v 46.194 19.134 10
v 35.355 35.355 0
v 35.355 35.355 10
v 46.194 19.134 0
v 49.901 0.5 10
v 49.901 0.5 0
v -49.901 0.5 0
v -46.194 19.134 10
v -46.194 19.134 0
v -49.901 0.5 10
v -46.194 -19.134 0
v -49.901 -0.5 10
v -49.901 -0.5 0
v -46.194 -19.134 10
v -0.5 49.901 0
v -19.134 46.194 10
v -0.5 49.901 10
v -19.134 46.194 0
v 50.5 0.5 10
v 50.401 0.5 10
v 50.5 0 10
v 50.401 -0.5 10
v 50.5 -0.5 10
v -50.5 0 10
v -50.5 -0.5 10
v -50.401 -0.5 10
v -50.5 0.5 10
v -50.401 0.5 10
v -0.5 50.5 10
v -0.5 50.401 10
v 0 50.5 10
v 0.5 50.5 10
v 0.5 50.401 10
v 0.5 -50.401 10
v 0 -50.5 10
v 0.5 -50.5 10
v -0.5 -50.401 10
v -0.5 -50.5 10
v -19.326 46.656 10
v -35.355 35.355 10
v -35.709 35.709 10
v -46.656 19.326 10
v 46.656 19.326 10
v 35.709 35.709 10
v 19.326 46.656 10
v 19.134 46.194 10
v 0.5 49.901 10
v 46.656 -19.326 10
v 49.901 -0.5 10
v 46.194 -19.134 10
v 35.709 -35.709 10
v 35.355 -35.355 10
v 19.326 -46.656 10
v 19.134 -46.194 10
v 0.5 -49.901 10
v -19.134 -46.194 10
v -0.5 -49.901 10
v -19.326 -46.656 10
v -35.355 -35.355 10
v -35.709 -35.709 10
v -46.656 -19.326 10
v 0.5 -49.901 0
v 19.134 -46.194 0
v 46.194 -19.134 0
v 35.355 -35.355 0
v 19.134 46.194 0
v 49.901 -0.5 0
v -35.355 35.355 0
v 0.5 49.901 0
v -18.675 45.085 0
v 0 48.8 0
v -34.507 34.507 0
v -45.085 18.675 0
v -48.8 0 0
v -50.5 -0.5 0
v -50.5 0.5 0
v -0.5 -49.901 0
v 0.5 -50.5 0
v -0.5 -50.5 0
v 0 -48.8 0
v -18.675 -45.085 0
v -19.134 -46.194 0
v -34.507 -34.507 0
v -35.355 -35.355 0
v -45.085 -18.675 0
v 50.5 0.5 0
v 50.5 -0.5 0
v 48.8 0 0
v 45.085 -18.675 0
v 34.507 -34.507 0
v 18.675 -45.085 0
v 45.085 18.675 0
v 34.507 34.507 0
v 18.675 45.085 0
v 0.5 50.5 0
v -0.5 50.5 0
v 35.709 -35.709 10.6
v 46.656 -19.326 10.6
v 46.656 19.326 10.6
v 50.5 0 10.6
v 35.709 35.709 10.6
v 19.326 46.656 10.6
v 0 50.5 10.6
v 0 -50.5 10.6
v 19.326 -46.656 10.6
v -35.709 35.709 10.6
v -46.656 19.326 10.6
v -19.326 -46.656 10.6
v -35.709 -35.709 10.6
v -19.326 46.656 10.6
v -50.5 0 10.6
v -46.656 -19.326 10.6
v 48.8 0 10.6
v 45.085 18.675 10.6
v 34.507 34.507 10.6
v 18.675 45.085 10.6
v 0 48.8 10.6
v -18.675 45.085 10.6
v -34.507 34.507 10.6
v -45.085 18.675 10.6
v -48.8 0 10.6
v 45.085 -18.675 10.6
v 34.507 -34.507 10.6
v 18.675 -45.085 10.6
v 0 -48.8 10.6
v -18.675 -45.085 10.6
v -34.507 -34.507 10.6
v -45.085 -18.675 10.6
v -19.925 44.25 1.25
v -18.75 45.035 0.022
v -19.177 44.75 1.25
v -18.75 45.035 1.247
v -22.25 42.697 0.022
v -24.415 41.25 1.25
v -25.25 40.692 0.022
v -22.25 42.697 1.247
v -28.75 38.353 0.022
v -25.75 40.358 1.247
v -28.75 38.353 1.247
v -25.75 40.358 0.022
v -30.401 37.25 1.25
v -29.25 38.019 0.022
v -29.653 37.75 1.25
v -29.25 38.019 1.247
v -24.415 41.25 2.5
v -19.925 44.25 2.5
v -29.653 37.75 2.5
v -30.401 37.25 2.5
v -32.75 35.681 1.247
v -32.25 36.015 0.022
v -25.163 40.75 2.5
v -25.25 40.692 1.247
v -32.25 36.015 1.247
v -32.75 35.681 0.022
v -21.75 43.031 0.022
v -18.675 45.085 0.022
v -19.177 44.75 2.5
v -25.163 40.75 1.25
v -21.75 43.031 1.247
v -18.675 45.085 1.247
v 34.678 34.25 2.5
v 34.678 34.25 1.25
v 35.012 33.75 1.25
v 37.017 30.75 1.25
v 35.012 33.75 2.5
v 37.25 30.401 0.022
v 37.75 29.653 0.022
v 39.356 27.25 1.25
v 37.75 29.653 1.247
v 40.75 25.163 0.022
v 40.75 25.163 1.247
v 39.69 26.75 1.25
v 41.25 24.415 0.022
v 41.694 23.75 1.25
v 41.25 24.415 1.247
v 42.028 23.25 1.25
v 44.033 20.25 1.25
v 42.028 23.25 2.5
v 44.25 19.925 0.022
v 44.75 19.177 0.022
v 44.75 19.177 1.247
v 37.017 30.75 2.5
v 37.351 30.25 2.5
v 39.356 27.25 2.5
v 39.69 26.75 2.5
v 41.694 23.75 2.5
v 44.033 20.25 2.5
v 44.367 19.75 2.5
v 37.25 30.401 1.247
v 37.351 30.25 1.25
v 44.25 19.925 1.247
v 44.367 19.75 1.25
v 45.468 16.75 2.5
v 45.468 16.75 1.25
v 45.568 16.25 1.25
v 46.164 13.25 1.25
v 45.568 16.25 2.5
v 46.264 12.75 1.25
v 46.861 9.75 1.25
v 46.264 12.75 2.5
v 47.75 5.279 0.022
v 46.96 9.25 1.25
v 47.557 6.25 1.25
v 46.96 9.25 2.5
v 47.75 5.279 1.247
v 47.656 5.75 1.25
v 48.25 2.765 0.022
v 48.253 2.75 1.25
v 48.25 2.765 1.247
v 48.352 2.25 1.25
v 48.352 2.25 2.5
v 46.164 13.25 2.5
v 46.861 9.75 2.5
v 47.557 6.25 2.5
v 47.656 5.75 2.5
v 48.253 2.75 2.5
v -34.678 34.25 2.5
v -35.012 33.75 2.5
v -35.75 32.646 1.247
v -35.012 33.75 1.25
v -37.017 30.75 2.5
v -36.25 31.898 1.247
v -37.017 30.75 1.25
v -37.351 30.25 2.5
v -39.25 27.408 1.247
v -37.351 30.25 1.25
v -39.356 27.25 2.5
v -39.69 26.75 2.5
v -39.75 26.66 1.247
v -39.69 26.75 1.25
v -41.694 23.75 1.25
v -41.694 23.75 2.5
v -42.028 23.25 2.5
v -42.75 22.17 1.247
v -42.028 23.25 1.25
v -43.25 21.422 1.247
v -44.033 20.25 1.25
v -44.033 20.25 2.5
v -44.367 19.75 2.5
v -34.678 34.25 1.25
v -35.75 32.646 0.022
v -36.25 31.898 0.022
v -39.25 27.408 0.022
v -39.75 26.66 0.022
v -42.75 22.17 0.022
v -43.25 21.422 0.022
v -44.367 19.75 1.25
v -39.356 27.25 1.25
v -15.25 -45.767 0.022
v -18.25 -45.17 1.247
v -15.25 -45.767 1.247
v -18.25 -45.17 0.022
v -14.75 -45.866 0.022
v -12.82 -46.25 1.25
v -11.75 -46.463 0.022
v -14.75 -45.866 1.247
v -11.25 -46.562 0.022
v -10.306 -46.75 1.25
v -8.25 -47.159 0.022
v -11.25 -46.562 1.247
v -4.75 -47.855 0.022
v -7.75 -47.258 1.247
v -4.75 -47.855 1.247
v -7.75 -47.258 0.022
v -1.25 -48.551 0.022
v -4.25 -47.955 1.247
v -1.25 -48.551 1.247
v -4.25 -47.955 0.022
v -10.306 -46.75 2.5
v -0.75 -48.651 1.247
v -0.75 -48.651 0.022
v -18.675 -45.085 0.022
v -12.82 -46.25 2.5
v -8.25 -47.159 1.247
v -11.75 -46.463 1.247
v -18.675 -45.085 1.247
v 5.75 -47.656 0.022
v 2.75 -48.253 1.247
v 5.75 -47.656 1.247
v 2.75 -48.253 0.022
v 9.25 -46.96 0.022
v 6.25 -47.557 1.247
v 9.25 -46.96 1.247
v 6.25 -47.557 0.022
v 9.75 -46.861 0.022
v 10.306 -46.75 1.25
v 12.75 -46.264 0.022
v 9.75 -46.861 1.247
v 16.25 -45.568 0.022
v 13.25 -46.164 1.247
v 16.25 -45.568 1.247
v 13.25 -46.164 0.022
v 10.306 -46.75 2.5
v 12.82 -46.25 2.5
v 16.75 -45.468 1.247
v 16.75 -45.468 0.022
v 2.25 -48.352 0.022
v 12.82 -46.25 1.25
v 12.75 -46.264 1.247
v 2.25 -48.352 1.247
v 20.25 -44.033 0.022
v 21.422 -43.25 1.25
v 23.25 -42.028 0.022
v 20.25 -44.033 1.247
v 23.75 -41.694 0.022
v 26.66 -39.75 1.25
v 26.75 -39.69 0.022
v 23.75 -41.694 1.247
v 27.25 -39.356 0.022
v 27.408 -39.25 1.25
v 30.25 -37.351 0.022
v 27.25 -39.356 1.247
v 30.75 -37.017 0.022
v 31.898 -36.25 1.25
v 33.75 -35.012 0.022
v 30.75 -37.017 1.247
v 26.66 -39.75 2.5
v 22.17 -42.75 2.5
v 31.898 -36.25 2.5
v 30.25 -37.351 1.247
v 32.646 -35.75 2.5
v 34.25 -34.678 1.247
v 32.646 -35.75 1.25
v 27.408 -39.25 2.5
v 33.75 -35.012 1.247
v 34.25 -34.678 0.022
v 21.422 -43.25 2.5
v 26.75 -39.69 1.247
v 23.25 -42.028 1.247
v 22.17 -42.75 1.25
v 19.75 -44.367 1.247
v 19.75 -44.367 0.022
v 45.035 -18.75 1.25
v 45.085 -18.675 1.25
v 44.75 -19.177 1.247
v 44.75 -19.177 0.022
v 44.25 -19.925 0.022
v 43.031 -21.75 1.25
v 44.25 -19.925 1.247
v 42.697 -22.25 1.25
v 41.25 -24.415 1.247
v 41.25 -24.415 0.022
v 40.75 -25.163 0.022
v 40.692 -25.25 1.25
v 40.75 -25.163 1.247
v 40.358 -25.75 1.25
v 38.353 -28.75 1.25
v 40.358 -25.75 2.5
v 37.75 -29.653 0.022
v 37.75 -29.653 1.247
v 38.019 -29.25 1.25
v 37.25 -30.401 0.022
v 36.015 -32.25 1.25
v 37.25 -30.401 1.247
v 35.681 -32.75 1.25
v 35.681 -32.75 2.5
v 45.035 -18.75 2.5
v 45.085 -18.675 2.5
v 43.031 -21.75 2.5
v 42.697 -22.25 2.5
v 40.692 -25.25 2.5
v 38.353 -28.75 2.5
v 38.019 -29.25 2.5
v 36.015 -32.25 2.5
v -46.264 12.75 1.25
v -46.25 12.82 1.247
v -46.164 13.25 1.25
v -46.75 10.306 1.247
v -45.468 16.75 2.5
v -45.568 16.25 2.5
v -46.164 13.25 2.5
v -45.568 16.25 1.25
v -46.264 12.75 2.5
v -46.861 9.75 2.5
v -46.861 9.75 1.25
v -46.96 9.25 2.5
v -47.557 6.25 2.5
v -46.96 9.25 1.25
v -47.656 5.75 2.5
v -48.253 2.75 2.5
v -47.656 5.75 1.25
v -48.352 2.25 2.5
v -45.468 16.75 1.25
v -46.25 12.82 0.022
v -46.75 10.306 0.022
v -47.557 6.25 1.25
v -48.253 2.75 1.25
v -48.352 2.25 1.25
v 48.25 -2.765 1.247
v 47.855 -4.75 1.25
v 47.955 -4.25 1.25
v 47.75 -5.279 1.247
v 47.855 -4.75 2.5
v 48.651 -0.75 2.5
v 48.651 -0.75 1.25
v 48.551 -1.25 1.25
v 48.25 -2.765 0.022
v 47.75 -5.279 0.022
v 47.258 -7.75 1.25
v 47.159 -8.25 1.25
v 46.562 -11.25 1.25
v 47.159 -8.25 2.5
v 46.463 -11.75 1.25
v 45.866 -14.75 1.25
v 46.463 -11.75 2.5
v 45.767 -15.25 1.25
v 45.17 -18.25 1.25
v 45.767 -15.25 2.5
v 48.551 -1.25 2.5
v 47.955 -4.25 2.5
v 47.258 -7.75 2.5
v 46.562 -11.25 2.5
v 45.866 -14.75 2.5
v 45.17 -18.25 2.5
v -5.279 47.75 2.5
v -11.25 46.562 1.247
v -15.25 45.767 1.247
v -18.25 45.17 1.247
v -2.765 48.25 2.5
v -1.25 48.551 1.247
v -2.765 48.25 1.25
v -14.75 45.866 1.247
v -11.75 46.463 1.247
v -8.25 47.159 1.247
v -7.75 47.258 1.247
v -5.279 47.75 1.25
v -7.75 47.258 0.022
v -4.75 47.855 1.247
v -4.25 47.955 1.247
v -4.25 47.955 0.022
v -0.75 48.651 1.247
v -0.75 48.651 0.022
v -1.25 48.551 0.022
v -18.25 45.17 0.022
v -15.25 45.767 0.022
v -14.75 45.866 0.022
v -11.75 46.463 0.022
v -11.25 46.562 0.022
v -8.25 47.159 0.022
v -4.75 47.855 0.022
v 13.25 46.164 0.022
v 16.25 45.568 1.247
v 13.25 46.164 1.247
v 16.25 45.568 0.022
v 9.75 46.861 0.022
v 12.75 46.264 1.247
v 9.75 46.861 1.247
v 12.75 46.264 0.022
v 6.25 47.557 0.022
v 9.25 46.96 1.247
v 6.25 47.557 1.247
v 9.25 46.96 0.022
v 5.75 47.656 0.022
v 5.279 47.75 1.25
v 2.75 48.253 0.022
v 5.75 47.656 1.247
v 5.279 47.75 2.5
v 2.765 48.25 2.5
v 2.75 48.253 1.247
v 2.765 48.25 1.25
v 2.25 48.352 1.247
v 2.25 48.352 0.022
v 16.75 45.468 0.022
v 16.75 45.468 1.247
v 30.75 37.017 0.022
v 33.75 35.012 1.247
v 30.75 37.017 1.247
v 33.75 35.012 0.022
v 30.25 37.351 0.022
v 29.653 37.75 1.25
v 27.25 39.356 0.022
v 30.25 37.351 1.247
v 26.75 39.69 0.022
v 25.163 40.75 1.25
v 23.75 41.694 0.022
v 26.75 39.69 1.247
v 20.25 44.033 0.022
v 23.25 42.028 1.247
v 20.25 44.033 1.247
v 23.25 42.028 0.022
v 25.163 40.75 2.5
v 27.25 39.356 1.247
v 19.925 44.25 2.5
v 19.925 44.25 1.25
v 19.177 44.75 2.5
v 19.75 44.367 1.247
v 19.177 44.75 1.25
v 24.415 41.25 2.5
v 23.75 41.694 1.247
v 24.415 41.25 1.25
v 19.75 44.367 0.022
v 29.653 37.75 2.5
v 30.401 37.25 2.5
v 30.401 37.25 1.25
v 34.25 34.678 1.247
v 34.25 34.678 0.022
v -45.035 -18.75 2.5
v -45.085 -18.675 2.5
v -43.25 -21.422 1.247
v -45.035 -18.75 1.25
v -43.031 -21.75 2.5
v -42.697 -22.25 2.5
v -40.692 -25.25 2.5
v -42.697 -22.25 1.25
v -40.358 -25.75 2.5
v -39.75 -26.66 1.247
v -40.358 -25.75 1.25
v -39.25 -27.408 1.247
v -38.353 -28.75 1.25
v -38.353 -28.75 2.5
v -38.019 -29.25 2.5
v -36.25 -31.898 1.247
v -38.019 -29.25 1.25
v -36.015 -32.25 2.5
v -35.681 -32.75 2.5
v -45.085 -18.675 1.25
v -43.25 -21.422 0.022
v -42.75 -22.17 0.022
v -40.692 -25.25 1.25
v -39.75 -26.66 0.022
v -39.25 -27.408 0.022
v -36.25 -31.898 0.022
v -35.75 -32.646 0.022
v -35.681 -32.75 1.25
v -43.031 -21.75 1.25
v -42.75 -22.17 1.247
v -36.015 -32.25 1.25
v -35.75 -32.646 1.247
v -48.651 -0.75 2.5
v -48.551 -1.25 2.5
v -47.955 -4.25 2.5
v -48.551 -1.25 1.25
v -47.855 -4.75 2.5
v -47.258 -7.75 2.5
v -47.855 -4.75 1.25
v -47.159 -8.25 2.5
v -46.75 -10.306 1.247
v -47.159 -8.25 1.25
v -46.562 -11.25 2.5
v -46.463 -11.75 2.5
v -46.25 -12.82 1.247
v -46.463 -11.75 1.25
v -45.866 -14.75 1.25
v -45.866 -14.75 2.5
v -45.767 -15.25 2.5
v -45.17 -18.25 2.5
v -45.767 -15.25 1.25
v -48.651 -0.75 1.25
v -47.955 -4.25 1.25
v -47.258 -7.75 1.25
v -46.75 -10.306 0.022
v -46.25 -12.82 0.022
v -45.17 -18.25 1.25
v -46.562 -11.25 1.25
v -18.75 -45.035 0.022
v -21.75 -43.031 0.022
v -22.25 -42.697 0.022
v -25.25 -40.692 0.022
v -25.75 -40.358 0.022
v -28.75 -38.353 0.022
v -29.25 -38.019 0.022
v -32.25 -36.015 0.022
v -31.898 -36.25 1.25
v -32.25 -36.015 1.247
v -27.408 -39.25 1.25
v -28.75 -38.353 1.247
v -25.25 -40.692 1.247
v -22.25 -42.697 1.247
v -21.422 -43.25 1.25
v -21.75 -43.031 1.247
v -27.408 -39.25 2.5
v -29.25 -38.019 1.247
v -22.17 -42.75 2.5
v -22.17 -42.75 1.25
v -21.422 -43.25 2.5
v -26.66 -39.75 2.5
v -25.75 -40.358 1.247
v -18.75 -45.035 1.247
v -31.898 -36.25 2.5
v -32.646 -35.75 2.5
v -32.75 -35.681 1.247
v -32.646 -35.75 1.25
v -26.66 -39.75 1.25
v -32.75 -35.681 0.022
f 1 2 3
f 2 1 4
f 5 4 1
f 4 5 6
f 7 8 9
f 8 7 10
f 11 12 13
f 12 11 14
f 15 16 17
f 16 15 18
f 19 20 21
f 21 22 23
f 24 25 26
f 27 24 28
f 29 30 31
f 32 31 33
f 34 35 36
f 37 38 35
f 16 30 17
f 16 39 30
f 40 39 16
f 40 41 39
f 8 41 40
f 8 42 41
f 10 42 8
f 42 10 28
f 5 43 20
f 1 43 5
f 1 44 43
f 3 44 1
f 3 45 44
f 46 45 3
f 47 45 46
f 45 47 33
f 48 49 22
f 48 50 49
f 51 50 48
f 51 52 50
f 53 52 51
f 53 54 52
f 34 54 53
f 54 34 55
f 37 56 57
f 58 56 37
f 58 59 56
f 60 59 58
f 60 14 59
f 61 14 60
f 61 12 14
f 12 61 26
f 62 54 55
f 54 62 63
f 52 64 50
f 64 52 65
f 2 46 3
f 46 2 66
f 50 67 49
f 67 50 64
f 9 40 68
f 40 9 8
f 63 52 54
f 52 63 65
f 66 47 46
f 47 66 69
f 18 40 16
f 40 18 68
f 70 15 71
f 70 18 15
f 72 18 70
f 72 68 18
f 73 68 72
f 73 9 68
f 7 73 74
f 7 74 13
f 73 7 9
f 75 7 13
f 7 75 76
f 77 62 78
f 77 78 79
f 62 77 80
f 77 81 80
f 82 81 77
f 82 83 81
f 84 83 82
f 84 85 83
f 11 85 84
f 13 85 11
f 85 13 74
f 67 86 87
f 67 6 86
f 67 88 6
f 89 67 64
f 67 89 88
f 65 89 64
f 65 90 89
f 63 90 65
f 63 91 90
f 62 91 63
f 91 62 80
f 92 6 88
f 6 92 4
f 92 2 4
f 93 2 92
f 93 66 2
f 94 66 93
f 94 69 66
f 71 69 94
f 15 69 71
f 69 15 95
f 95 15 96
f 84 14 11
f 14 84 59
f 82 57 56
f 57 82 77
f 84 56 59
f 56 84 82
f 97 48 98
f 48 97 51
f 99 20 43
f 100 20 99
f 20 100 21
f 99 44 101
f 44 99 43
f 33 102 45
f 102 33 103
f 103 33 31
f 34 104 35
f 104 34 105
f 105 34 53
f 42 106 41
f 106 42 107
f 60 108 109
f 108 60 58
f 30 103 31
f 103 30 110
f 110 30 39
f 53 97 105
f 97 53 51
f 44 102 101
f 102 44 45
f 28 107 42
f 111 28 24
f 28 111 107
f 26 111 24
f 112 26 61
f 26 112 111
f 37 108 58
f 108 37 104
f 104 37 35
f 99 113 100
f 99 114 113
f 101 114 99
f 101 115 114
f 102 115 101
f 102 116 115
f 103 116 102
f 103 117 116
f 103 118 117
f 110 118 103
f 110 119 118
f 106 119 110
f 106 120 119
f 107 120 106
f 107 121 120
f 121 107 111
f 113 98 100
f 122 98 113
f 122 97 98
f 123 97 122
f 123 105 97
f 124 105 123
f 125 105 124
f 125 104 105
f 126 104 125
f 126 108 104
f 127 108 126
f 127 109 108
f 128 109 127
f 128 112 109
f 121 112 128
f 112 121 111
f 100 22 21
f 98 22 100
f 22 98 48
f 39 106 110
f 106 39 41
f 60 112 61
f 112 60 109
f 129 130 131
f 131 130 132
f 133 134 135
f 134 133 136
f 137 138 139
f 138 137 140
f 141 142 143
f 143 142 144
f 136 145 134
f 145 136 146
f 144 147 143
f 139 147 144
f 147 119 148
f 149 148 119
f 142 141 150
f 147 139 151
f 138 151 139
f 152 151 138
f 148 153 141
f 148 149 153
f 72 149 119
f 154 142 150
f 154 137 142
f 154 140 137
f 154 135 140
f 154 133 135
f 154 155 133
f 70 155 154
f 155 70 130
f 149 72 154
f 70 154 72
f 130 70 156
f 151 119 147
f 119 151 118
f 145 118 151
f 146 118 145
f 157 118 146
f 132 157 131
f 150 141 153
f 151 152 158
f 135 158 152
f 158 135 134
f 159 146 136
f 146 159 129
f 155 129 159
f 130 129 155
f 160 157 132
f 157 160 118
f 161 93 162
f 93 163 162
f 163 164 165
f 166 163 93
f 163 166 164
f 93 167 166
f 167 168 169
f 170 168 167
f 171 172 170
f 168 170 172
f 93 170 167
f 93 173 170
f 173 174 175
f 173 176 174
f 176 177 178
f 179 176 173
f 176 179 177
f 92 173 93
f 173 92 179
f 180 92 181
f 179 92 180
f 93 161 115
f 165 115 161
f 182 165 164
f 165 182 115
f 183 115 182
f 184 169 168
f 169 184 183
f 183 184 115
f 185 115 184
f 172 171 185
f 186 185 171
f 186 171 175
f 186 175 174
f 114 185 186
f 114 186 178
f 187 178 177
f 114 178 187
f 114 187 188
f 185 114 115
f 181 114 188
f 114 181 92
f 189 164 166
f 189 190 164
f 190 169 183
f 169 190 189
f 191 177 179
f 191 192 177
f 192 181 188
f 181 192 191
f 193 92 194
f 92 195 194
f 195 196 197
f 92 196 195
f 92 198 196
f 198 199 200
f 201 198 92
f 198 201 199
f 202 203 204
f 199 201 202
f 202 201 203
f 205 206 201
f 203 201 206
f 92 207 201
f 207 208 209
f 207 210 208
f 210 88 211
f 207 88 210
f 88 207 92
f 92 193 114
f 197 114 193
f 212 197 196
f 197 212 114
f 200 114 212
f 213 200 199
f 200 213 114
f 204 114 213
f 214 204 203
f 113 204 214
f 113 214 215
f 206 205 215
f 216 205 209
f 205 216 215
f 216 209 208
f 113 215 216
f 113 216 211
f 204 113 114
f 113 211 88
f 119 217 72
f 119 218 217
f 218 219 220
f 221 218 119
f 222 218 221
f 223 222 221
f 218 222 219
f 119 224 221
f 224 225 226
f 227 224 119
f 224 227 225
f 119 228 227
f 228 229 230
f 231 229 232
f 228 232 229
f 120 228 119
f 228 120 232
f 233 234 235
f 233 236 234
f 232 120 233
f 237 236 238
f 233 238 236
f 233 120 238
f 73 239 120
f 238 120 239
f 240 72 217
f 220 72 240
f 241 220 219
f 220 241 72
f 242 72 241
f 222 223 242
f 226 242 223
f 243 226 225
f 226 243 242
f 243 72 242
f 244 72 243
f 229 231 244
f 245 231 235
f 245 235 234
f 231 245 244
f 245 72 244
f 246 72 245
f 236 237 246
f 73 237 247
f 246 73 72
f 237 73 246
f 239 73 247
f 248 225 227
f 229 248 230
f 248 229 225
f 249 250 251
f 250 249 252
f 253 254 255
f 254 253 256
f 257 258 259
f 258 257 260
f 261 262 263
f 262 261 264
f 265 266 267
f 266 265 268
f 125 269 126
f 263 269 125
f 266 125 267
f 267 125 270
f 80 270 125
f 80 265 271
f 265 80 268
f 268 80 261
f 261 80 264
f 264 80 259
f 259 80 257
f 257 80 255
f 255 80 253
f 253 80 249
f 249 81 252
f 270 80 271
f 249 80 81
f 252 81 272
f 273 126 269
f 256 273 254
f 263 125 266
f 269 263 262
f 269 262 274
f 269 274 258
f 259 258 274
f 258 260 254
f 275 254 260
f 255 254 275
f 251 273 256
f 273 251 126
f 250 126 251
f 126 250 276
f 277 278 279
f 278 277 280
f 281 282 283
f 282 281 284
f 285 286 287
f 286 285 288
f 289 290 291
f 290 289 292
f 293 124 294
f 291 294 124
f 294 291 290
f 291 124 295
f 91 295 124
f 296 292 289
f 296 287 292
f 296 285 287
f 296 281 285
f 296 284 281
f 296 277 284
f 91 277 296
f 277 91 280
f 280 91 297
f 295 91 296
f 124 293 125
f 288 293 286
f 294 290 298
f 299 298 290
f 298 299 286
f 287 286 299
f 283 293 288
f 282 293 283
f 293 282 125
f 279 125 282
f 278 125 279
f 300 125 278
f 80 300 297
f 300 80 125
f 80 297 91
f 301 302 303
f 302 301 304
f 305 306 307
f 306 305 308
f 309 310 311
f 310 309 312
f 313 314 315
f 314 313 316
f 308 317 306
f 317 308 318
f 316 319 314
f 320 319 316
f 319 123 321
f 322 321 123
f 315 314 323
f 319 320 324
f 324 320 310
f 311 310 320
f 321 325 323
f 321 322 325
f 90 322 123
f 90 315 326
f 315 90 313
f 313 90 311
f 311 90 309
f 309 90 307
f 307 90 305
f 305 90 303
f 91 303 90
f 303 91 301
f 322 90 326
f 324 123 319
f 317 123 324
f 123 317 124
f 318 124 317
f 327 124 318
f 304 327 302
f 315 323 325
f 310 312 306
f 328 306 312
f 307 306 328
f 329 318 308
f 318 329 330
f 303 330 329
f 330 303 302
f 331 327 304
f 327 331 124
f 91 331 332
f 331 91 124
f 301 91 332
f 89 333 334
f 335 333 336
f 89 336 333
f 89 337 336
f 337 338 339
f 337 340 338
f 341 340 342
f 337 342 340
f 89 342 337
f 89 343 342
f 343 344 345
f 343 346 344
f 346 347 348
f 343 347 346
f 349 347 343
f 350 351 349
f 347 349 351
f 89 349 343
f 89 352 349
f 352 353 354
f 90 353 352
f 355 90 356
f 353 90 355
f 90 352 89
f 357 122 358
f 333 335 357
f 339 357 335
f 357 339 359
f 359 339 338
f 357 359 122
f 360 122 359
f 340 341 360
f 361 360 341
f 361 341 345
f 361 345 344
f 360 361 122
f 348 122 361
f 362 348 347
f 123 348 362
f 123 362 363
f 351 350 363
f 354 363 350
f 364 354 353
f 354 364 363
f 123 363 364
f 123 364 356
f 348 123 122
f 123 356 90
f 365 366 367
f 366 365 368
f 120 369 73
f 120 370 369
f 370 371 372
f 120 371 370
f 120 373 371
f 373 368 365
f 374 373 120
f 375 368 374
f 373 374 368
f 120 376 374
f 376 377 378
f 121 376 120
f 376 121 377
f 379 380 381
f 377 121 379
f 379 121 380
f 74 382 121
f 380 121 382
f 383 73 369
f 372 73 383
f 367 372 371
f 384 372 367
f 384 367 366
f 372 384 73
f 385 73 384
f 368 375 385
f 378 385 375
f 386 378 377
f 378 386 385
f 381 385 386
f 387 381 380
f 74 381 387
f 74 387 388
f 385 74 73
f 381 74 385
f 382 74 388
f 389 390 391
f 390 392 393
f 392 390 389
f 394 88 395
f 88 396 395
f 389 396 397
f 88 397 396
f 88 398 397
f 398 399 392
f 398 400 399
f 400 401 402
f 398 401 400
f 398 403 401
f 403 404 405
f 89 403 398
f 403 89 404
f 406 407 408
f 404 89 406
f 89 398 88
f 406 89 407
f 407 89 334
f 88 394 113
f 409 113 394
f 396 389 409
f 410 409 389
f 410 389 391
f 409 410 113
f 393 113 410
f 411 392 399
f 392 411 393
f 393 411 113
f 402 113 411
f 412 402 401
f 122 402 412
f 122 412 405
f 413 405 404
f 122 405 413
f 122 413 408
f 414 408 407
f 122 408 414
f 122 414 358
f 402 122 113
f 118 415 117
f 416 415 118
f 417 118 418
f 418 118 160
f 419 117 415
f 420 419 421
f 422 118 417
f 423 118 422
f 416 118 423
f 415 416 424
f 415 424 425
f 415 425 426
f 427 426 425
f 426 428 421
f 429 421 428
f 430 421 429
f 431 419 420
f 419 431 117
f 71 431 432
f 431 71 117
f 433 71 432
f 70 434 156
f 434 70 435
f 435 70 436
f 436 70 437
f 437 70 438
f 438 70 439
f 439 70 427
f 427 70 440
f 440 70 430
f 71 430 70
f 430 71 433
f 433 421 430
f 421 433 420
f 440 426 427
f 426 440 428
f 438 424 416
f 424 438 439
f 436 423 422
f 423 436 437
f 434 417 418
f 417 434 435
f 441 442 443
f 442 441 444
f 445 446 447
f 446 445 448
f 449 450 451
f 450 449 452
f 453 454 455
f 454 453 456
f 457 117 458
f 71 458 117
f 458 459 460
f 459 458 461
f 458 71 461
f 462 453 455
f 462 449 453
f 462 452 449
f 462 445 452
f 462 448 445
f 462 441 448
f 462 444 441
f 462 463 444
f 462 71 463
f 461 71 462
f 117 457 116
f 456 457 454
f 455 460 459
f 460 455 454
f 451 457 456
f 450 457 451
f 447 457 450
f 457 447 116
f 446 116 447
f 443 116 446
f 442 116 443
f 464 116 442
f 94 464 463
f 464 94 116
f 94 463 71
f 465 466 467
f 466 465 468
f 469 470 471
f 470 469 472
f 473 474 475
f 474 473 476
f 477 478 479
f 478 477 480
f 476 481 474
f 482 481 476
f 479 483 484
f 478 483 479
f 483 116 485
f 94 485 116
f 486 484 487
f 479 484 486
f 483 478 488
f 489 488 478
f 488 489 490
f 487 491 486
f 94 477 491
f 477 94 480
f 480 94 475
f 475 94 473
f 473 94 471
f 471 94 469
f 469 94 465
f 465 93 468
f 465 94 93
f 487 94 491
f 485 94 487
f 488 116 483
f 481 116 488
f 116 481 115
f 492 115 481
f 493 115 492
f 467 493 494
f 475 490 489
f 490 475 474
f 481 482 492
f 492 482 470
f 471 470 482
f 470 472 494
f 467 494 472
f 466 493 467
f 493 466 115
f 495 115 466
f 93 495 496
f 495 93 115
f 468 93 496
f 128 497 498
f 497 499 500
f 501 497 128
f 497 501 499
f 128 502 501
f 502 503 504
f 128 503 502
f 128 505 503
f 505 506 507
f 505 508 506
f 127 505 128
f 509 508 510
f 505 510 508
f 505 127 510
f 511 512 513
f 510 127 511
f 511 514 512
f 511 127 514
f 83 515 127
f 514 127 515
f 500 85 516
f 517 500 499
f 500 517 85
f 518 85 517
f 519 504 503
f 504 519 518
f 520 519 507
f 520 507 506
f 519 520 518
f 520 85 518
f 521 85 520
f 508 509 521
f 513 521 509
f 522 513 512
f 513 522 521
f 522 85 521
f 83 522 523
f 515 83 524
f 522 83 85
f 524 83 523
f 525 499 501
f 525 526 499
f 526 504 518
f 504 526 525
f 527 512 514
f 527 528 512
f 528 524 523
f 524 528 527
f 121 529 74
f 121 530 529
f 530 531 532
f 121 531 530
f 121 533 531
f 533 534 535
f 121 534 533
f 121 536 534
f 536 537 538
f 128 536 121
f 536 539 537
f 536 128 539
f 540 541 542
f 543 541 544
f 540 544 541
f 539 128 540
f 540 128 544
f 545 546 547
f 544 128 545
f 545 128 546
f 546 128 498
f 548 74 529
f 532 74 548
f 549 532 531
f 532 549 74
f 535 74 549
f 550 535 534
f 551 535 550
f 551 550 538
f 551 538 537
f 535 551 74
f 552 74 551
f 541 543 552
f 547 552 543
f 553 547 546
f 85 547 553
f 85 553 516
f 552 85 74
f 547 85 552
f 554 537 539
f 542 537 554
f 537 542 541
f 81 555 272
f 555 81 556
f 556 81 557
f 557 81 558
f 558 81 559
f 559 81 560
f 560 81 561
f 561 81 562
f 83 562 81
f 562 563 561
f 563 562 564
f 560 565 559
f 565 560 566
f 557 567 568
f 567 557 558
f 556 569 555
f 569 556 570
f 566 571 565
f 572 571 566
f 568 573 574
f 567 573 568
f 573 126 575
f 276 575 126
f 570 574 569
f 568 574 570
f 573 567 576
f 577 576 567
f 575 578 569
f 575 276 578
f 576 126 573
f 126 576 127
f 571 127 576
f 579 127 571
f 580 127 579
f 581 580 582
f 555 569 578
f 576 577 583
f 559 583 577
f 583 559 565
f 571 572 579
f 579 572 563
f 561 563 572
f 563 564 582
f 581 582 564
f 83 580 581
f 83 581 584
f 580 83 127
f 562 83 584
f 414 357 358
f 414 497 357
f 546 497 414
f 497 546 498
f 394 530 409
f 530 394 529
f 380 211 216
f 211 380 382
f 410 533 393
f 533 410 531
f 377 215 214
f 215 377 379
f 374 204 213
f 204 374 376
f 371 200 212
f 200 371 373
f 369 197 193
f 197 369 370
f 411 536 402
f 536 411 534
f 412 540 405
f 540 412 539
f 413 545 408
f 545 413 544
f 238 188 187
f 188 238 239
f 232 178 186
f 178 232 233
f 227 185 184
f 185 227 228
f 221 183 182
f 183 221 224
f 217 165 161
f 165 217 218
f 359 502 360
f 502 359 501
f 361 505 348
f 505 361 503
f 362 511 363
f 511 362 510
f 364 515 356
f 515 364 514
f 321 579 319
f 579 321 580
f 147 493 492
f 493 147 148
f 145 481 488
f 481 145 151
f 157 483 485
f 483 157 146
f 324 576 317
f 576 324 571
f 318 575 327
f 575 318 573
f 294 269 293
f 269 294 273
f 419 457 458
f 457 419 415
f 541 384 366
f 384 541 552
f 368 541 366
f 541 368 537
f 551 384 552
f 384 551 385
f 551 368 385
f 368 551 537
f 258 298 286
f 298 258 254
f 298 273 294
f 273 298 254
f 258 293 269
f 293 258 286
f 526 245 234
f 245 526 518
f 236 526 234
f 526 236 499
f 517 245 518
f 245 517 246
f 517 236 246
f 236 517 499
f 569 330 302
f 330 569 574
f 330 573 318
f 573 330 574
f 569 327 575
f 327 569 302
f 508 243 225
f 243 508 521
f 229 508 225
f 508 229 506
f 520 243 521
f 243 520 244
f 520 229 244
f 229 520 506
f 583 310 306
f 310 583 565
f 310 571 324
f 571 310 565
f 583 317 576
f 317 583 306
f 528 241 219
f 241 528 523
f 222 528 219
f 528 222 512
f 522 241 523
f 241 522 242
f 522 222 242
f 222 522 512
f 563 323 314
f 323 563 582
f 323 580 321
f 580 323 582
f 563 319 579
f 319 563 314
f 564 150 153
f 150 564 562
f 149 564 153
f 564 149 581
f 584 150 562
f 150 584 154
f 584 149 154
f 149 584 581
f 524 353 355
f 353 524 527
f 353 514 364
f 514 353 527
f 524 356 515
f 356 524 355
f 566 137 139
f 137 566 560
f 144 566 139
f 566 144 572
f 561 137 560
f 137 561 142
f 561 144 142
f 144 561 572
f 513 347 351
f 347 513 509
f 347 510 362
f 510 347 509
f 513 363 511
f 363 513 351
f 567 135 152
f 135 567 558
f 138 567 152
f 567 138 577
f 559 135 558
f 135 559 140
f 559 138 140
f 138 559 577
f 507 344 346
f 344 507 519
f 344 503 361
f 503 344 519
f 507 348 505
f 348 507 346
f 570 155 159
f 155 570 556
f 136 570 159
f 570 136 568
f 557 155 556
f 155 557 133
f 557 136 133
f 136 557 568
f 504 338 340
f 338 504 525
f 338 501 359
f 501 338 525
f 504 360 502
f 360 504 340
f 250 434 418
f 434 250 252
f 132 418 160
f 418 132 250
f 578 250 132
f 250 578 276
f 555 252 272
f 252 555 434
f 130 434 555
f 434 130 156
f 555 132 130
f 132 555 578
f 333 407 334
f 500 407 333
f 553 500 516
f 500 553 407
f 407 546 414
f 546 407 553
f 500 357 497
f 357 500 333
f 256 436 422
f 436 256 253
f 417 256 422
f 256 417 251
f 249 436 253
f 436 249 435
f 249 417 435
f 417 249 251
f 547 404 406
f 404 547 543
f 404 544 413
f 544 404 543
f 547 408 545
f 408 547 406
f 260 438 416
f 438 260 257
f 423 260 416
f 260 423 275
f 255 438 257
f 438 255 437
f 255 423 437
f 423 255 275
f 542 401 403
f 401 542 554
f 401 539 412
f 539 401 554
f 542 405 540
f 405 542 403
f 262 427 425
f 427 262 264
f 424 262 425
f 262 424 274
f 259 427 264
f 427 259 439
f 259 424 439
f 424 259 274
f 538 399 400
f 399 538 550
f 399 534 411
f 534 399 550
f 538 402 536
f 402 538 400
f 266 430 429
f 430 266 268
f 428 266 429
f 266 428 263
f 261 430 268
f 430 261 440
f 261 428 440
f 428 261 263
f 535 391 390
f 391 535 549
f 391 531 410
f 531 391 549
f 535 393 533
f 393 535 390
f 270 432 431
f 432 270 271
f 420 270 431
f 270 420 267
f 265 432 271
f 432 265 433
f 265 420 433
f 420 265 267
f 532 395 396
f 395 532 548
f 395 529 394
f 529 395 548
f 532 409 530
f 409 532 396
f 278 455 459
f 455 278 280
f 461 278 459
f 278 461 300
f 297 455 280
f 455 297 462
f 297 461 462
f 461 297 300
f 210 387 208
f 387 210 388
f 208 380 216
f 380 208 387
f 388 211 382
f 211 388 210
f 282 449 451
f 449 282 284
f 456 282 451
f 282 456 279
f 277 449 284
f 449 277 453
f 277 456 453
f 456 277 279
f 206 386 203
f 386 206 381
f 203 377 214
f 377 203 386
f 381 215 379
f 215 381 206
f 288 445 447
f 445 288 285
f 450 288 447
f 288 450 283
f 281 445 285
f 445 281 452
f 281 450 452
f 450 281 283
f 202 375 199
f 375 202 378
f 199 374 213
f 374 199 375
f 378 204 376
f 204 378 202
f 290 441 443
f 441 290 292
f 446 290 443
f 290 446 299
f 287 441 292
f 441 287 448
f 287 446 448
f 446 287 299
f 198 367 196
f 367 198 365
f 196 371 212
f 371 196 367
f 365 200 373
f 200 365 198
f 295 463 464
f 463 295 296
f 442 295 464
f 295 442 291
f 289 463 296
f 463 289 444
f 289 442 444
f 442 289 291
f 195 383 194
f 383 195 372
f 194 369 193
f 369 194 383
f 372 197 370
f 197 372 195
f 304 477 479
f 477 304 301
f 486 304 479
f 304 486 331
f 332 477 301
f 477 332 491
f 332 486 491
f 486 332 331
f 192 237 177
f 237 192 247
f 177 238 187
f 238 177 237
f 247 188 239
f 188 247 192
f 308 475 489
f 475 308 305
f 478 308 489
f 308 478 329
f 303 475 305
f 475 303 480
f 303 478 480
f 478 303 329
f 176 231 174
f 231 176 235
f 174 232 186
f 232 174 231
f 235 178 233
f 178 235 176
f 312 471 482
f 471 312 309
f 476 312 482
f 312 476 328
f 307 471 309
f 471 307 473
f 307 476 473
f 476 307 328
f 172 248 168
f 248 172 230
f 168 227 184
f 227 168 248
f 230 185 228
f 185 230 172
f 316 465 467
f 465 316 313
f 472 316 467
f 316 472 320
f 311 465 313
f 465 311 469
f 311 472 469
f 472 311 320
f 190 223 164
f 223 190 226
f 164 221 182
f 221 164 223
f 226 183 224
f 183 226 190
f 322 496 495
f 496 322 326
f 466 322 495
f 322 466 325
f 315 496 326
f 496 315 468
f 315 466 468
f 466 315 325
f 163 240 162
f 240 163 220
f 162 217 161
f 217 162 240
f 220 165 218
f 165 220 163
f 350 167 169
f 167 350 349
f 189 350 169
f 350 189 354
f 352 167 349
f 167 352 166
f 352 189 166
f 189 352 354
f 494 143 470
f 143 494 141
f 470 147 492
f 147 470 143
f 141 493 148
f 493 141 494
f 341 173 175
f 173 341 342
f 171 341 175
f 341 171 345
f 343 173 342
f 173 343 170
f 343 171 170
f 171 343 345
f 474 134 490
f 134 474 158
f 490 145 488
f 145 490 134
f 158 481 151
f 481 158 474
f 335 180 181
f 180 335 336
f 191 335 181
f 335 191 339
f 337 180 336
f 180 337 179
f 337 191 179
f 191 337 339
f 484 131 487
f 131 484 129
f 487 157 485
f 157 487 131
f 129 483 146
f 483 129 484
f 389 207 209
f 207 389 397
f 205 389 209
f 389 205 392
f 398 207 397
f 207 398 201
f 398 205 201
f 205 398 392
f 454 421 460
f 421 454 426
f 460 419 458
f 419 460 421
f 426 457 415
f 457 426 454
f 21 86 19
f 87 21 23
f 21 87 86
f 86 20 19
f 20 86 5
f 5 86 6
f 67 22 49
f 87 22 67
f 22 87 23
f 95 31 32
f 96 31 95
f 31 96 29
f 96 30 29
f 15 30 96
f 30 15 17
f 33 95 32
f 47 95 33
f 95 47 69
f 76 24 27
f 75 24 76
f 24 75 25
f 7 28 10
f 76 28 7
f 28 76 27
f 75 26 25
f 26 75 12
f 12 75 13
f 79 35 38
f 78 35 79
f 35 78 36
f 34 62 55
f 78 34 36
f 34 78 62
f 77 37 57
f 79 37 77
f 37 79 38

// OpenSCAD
// Custom Screen to fill a hole (c) 2013 David Smith
// licensed under the Creative Commons - GNU GPL license.
// http://www.thingiverse.com/thing:112117

/* [Hole] */

// Hole Shape 
shape= 16; // [ 3:Triangle, 4:Square, 5:Pentagon, 6:Hexagon, 8:Octagon, 16:Rough Circle, 128:Smooth Circle ]

// Diameter of a circle connecting all the points definiting your hole's shape (mm). 
diameter = 100; 

// Hole depth (mm)
depth = 10 ; 

// Width of the screen's frame (mm).
frame_thickness = 1.2;

// Size of the border (mm). Only 'flush' screens have borders. 
border_size = 2.4;

/* [Screen] */

// Spacing between mesh threads (mm). 
mesh_space=3;

// Thickness of the screen (mm). It should be a multiple of your slicer's layer height for best results.
mesh_height=2.5; 

// Screen is flush to the surface or recessed.
indention = 0; // [0:Recessed, 1:Flush]

/* [Slicer] */

// The thickness of your slices (mm). Screen threads are a multiple of this for their height.
printer_layer_height = 0.25;  

// The shell or skin size of your slicer (mm) .
printer_skin_size =    0.6;

// The width of your extruded filament (mm). Screen threads are a multiple of this for their width. 
printer_extrusion_width = 0.5;

/* [Hidden] */
 
smooth = shape;

custom_shape_screen();

module custom_shape_screen() {
union() {
	difference() {   
		union() {
			cylinder(h=depth, r=diameter/2, $fn=smooth);		

			if (indention == 1)  
				// Brim if screen is flush and at the bottom 
				cylinder(h=frame_thickness, r=(border_size + diameter/2), $fn=smooth);
			else
				// OR add a small brim on the bottom side (that prints on top)
				translate([0,0,depth])
				cylinder(h=printer_skin_size, r=(printer_extrusion_width + diameter/2), $fn=smooth);
		}

		translate([0,0,-1])
		cylinder(h=depth+3, r=(diameter/2)-frame_thickness, $fn=smooth);
	}

	meshscreen_shape(h=mesh_height,
				mesh_w=printer_extrusion_width,
				mesh_space=mesh_space,
				width=diameter,
				layer_h=printer_layer_height);

	// Make little nubs on the sides to tighten the fit a little (but only for circles).
	if (smooth > 8)
	for (i = [0:3]) {
		rotate(90*i,[0,0,1])
		translate([(diameter/2),0,depth/2])
		cube(size=[1,1,depth],center=true);
	}
}
}

module meshscreen_shape(h=2,mesh_w=1,mesh_space=2,width=60,layer_h){
	intersection(){
		cylinder(r=width/2,h,$fn=smooth);
		mesh_raw(h=h,mesh_w=mesh_w,mesh_space=mesh_space,width=width,layer_height=layer_h);
	}
	difference(){
		cylinder(r=width/2,h, $fn=smooth);
		translate([0,0,-h*0.05]) cylinder(r=width/2-0,h=h*1.1, $fn=smooth);
	}
}

module mesh_raw(h=2,mesh_w=1,mesh_space=2,width=50,layer_height){
	for ( j = [0 :(mesh_w+mesh_space): width] )
	{
	   	translate([0,0,0.01])translate([-width/2+j, 0, h/4])cube([mesh_w,width,h/2-layer_height/10],center=true);
		translate([0,0,h/2])translate([0, -width/2+j, h/4])cube([width,mesh_w,h/2],center=true);
	}
}
